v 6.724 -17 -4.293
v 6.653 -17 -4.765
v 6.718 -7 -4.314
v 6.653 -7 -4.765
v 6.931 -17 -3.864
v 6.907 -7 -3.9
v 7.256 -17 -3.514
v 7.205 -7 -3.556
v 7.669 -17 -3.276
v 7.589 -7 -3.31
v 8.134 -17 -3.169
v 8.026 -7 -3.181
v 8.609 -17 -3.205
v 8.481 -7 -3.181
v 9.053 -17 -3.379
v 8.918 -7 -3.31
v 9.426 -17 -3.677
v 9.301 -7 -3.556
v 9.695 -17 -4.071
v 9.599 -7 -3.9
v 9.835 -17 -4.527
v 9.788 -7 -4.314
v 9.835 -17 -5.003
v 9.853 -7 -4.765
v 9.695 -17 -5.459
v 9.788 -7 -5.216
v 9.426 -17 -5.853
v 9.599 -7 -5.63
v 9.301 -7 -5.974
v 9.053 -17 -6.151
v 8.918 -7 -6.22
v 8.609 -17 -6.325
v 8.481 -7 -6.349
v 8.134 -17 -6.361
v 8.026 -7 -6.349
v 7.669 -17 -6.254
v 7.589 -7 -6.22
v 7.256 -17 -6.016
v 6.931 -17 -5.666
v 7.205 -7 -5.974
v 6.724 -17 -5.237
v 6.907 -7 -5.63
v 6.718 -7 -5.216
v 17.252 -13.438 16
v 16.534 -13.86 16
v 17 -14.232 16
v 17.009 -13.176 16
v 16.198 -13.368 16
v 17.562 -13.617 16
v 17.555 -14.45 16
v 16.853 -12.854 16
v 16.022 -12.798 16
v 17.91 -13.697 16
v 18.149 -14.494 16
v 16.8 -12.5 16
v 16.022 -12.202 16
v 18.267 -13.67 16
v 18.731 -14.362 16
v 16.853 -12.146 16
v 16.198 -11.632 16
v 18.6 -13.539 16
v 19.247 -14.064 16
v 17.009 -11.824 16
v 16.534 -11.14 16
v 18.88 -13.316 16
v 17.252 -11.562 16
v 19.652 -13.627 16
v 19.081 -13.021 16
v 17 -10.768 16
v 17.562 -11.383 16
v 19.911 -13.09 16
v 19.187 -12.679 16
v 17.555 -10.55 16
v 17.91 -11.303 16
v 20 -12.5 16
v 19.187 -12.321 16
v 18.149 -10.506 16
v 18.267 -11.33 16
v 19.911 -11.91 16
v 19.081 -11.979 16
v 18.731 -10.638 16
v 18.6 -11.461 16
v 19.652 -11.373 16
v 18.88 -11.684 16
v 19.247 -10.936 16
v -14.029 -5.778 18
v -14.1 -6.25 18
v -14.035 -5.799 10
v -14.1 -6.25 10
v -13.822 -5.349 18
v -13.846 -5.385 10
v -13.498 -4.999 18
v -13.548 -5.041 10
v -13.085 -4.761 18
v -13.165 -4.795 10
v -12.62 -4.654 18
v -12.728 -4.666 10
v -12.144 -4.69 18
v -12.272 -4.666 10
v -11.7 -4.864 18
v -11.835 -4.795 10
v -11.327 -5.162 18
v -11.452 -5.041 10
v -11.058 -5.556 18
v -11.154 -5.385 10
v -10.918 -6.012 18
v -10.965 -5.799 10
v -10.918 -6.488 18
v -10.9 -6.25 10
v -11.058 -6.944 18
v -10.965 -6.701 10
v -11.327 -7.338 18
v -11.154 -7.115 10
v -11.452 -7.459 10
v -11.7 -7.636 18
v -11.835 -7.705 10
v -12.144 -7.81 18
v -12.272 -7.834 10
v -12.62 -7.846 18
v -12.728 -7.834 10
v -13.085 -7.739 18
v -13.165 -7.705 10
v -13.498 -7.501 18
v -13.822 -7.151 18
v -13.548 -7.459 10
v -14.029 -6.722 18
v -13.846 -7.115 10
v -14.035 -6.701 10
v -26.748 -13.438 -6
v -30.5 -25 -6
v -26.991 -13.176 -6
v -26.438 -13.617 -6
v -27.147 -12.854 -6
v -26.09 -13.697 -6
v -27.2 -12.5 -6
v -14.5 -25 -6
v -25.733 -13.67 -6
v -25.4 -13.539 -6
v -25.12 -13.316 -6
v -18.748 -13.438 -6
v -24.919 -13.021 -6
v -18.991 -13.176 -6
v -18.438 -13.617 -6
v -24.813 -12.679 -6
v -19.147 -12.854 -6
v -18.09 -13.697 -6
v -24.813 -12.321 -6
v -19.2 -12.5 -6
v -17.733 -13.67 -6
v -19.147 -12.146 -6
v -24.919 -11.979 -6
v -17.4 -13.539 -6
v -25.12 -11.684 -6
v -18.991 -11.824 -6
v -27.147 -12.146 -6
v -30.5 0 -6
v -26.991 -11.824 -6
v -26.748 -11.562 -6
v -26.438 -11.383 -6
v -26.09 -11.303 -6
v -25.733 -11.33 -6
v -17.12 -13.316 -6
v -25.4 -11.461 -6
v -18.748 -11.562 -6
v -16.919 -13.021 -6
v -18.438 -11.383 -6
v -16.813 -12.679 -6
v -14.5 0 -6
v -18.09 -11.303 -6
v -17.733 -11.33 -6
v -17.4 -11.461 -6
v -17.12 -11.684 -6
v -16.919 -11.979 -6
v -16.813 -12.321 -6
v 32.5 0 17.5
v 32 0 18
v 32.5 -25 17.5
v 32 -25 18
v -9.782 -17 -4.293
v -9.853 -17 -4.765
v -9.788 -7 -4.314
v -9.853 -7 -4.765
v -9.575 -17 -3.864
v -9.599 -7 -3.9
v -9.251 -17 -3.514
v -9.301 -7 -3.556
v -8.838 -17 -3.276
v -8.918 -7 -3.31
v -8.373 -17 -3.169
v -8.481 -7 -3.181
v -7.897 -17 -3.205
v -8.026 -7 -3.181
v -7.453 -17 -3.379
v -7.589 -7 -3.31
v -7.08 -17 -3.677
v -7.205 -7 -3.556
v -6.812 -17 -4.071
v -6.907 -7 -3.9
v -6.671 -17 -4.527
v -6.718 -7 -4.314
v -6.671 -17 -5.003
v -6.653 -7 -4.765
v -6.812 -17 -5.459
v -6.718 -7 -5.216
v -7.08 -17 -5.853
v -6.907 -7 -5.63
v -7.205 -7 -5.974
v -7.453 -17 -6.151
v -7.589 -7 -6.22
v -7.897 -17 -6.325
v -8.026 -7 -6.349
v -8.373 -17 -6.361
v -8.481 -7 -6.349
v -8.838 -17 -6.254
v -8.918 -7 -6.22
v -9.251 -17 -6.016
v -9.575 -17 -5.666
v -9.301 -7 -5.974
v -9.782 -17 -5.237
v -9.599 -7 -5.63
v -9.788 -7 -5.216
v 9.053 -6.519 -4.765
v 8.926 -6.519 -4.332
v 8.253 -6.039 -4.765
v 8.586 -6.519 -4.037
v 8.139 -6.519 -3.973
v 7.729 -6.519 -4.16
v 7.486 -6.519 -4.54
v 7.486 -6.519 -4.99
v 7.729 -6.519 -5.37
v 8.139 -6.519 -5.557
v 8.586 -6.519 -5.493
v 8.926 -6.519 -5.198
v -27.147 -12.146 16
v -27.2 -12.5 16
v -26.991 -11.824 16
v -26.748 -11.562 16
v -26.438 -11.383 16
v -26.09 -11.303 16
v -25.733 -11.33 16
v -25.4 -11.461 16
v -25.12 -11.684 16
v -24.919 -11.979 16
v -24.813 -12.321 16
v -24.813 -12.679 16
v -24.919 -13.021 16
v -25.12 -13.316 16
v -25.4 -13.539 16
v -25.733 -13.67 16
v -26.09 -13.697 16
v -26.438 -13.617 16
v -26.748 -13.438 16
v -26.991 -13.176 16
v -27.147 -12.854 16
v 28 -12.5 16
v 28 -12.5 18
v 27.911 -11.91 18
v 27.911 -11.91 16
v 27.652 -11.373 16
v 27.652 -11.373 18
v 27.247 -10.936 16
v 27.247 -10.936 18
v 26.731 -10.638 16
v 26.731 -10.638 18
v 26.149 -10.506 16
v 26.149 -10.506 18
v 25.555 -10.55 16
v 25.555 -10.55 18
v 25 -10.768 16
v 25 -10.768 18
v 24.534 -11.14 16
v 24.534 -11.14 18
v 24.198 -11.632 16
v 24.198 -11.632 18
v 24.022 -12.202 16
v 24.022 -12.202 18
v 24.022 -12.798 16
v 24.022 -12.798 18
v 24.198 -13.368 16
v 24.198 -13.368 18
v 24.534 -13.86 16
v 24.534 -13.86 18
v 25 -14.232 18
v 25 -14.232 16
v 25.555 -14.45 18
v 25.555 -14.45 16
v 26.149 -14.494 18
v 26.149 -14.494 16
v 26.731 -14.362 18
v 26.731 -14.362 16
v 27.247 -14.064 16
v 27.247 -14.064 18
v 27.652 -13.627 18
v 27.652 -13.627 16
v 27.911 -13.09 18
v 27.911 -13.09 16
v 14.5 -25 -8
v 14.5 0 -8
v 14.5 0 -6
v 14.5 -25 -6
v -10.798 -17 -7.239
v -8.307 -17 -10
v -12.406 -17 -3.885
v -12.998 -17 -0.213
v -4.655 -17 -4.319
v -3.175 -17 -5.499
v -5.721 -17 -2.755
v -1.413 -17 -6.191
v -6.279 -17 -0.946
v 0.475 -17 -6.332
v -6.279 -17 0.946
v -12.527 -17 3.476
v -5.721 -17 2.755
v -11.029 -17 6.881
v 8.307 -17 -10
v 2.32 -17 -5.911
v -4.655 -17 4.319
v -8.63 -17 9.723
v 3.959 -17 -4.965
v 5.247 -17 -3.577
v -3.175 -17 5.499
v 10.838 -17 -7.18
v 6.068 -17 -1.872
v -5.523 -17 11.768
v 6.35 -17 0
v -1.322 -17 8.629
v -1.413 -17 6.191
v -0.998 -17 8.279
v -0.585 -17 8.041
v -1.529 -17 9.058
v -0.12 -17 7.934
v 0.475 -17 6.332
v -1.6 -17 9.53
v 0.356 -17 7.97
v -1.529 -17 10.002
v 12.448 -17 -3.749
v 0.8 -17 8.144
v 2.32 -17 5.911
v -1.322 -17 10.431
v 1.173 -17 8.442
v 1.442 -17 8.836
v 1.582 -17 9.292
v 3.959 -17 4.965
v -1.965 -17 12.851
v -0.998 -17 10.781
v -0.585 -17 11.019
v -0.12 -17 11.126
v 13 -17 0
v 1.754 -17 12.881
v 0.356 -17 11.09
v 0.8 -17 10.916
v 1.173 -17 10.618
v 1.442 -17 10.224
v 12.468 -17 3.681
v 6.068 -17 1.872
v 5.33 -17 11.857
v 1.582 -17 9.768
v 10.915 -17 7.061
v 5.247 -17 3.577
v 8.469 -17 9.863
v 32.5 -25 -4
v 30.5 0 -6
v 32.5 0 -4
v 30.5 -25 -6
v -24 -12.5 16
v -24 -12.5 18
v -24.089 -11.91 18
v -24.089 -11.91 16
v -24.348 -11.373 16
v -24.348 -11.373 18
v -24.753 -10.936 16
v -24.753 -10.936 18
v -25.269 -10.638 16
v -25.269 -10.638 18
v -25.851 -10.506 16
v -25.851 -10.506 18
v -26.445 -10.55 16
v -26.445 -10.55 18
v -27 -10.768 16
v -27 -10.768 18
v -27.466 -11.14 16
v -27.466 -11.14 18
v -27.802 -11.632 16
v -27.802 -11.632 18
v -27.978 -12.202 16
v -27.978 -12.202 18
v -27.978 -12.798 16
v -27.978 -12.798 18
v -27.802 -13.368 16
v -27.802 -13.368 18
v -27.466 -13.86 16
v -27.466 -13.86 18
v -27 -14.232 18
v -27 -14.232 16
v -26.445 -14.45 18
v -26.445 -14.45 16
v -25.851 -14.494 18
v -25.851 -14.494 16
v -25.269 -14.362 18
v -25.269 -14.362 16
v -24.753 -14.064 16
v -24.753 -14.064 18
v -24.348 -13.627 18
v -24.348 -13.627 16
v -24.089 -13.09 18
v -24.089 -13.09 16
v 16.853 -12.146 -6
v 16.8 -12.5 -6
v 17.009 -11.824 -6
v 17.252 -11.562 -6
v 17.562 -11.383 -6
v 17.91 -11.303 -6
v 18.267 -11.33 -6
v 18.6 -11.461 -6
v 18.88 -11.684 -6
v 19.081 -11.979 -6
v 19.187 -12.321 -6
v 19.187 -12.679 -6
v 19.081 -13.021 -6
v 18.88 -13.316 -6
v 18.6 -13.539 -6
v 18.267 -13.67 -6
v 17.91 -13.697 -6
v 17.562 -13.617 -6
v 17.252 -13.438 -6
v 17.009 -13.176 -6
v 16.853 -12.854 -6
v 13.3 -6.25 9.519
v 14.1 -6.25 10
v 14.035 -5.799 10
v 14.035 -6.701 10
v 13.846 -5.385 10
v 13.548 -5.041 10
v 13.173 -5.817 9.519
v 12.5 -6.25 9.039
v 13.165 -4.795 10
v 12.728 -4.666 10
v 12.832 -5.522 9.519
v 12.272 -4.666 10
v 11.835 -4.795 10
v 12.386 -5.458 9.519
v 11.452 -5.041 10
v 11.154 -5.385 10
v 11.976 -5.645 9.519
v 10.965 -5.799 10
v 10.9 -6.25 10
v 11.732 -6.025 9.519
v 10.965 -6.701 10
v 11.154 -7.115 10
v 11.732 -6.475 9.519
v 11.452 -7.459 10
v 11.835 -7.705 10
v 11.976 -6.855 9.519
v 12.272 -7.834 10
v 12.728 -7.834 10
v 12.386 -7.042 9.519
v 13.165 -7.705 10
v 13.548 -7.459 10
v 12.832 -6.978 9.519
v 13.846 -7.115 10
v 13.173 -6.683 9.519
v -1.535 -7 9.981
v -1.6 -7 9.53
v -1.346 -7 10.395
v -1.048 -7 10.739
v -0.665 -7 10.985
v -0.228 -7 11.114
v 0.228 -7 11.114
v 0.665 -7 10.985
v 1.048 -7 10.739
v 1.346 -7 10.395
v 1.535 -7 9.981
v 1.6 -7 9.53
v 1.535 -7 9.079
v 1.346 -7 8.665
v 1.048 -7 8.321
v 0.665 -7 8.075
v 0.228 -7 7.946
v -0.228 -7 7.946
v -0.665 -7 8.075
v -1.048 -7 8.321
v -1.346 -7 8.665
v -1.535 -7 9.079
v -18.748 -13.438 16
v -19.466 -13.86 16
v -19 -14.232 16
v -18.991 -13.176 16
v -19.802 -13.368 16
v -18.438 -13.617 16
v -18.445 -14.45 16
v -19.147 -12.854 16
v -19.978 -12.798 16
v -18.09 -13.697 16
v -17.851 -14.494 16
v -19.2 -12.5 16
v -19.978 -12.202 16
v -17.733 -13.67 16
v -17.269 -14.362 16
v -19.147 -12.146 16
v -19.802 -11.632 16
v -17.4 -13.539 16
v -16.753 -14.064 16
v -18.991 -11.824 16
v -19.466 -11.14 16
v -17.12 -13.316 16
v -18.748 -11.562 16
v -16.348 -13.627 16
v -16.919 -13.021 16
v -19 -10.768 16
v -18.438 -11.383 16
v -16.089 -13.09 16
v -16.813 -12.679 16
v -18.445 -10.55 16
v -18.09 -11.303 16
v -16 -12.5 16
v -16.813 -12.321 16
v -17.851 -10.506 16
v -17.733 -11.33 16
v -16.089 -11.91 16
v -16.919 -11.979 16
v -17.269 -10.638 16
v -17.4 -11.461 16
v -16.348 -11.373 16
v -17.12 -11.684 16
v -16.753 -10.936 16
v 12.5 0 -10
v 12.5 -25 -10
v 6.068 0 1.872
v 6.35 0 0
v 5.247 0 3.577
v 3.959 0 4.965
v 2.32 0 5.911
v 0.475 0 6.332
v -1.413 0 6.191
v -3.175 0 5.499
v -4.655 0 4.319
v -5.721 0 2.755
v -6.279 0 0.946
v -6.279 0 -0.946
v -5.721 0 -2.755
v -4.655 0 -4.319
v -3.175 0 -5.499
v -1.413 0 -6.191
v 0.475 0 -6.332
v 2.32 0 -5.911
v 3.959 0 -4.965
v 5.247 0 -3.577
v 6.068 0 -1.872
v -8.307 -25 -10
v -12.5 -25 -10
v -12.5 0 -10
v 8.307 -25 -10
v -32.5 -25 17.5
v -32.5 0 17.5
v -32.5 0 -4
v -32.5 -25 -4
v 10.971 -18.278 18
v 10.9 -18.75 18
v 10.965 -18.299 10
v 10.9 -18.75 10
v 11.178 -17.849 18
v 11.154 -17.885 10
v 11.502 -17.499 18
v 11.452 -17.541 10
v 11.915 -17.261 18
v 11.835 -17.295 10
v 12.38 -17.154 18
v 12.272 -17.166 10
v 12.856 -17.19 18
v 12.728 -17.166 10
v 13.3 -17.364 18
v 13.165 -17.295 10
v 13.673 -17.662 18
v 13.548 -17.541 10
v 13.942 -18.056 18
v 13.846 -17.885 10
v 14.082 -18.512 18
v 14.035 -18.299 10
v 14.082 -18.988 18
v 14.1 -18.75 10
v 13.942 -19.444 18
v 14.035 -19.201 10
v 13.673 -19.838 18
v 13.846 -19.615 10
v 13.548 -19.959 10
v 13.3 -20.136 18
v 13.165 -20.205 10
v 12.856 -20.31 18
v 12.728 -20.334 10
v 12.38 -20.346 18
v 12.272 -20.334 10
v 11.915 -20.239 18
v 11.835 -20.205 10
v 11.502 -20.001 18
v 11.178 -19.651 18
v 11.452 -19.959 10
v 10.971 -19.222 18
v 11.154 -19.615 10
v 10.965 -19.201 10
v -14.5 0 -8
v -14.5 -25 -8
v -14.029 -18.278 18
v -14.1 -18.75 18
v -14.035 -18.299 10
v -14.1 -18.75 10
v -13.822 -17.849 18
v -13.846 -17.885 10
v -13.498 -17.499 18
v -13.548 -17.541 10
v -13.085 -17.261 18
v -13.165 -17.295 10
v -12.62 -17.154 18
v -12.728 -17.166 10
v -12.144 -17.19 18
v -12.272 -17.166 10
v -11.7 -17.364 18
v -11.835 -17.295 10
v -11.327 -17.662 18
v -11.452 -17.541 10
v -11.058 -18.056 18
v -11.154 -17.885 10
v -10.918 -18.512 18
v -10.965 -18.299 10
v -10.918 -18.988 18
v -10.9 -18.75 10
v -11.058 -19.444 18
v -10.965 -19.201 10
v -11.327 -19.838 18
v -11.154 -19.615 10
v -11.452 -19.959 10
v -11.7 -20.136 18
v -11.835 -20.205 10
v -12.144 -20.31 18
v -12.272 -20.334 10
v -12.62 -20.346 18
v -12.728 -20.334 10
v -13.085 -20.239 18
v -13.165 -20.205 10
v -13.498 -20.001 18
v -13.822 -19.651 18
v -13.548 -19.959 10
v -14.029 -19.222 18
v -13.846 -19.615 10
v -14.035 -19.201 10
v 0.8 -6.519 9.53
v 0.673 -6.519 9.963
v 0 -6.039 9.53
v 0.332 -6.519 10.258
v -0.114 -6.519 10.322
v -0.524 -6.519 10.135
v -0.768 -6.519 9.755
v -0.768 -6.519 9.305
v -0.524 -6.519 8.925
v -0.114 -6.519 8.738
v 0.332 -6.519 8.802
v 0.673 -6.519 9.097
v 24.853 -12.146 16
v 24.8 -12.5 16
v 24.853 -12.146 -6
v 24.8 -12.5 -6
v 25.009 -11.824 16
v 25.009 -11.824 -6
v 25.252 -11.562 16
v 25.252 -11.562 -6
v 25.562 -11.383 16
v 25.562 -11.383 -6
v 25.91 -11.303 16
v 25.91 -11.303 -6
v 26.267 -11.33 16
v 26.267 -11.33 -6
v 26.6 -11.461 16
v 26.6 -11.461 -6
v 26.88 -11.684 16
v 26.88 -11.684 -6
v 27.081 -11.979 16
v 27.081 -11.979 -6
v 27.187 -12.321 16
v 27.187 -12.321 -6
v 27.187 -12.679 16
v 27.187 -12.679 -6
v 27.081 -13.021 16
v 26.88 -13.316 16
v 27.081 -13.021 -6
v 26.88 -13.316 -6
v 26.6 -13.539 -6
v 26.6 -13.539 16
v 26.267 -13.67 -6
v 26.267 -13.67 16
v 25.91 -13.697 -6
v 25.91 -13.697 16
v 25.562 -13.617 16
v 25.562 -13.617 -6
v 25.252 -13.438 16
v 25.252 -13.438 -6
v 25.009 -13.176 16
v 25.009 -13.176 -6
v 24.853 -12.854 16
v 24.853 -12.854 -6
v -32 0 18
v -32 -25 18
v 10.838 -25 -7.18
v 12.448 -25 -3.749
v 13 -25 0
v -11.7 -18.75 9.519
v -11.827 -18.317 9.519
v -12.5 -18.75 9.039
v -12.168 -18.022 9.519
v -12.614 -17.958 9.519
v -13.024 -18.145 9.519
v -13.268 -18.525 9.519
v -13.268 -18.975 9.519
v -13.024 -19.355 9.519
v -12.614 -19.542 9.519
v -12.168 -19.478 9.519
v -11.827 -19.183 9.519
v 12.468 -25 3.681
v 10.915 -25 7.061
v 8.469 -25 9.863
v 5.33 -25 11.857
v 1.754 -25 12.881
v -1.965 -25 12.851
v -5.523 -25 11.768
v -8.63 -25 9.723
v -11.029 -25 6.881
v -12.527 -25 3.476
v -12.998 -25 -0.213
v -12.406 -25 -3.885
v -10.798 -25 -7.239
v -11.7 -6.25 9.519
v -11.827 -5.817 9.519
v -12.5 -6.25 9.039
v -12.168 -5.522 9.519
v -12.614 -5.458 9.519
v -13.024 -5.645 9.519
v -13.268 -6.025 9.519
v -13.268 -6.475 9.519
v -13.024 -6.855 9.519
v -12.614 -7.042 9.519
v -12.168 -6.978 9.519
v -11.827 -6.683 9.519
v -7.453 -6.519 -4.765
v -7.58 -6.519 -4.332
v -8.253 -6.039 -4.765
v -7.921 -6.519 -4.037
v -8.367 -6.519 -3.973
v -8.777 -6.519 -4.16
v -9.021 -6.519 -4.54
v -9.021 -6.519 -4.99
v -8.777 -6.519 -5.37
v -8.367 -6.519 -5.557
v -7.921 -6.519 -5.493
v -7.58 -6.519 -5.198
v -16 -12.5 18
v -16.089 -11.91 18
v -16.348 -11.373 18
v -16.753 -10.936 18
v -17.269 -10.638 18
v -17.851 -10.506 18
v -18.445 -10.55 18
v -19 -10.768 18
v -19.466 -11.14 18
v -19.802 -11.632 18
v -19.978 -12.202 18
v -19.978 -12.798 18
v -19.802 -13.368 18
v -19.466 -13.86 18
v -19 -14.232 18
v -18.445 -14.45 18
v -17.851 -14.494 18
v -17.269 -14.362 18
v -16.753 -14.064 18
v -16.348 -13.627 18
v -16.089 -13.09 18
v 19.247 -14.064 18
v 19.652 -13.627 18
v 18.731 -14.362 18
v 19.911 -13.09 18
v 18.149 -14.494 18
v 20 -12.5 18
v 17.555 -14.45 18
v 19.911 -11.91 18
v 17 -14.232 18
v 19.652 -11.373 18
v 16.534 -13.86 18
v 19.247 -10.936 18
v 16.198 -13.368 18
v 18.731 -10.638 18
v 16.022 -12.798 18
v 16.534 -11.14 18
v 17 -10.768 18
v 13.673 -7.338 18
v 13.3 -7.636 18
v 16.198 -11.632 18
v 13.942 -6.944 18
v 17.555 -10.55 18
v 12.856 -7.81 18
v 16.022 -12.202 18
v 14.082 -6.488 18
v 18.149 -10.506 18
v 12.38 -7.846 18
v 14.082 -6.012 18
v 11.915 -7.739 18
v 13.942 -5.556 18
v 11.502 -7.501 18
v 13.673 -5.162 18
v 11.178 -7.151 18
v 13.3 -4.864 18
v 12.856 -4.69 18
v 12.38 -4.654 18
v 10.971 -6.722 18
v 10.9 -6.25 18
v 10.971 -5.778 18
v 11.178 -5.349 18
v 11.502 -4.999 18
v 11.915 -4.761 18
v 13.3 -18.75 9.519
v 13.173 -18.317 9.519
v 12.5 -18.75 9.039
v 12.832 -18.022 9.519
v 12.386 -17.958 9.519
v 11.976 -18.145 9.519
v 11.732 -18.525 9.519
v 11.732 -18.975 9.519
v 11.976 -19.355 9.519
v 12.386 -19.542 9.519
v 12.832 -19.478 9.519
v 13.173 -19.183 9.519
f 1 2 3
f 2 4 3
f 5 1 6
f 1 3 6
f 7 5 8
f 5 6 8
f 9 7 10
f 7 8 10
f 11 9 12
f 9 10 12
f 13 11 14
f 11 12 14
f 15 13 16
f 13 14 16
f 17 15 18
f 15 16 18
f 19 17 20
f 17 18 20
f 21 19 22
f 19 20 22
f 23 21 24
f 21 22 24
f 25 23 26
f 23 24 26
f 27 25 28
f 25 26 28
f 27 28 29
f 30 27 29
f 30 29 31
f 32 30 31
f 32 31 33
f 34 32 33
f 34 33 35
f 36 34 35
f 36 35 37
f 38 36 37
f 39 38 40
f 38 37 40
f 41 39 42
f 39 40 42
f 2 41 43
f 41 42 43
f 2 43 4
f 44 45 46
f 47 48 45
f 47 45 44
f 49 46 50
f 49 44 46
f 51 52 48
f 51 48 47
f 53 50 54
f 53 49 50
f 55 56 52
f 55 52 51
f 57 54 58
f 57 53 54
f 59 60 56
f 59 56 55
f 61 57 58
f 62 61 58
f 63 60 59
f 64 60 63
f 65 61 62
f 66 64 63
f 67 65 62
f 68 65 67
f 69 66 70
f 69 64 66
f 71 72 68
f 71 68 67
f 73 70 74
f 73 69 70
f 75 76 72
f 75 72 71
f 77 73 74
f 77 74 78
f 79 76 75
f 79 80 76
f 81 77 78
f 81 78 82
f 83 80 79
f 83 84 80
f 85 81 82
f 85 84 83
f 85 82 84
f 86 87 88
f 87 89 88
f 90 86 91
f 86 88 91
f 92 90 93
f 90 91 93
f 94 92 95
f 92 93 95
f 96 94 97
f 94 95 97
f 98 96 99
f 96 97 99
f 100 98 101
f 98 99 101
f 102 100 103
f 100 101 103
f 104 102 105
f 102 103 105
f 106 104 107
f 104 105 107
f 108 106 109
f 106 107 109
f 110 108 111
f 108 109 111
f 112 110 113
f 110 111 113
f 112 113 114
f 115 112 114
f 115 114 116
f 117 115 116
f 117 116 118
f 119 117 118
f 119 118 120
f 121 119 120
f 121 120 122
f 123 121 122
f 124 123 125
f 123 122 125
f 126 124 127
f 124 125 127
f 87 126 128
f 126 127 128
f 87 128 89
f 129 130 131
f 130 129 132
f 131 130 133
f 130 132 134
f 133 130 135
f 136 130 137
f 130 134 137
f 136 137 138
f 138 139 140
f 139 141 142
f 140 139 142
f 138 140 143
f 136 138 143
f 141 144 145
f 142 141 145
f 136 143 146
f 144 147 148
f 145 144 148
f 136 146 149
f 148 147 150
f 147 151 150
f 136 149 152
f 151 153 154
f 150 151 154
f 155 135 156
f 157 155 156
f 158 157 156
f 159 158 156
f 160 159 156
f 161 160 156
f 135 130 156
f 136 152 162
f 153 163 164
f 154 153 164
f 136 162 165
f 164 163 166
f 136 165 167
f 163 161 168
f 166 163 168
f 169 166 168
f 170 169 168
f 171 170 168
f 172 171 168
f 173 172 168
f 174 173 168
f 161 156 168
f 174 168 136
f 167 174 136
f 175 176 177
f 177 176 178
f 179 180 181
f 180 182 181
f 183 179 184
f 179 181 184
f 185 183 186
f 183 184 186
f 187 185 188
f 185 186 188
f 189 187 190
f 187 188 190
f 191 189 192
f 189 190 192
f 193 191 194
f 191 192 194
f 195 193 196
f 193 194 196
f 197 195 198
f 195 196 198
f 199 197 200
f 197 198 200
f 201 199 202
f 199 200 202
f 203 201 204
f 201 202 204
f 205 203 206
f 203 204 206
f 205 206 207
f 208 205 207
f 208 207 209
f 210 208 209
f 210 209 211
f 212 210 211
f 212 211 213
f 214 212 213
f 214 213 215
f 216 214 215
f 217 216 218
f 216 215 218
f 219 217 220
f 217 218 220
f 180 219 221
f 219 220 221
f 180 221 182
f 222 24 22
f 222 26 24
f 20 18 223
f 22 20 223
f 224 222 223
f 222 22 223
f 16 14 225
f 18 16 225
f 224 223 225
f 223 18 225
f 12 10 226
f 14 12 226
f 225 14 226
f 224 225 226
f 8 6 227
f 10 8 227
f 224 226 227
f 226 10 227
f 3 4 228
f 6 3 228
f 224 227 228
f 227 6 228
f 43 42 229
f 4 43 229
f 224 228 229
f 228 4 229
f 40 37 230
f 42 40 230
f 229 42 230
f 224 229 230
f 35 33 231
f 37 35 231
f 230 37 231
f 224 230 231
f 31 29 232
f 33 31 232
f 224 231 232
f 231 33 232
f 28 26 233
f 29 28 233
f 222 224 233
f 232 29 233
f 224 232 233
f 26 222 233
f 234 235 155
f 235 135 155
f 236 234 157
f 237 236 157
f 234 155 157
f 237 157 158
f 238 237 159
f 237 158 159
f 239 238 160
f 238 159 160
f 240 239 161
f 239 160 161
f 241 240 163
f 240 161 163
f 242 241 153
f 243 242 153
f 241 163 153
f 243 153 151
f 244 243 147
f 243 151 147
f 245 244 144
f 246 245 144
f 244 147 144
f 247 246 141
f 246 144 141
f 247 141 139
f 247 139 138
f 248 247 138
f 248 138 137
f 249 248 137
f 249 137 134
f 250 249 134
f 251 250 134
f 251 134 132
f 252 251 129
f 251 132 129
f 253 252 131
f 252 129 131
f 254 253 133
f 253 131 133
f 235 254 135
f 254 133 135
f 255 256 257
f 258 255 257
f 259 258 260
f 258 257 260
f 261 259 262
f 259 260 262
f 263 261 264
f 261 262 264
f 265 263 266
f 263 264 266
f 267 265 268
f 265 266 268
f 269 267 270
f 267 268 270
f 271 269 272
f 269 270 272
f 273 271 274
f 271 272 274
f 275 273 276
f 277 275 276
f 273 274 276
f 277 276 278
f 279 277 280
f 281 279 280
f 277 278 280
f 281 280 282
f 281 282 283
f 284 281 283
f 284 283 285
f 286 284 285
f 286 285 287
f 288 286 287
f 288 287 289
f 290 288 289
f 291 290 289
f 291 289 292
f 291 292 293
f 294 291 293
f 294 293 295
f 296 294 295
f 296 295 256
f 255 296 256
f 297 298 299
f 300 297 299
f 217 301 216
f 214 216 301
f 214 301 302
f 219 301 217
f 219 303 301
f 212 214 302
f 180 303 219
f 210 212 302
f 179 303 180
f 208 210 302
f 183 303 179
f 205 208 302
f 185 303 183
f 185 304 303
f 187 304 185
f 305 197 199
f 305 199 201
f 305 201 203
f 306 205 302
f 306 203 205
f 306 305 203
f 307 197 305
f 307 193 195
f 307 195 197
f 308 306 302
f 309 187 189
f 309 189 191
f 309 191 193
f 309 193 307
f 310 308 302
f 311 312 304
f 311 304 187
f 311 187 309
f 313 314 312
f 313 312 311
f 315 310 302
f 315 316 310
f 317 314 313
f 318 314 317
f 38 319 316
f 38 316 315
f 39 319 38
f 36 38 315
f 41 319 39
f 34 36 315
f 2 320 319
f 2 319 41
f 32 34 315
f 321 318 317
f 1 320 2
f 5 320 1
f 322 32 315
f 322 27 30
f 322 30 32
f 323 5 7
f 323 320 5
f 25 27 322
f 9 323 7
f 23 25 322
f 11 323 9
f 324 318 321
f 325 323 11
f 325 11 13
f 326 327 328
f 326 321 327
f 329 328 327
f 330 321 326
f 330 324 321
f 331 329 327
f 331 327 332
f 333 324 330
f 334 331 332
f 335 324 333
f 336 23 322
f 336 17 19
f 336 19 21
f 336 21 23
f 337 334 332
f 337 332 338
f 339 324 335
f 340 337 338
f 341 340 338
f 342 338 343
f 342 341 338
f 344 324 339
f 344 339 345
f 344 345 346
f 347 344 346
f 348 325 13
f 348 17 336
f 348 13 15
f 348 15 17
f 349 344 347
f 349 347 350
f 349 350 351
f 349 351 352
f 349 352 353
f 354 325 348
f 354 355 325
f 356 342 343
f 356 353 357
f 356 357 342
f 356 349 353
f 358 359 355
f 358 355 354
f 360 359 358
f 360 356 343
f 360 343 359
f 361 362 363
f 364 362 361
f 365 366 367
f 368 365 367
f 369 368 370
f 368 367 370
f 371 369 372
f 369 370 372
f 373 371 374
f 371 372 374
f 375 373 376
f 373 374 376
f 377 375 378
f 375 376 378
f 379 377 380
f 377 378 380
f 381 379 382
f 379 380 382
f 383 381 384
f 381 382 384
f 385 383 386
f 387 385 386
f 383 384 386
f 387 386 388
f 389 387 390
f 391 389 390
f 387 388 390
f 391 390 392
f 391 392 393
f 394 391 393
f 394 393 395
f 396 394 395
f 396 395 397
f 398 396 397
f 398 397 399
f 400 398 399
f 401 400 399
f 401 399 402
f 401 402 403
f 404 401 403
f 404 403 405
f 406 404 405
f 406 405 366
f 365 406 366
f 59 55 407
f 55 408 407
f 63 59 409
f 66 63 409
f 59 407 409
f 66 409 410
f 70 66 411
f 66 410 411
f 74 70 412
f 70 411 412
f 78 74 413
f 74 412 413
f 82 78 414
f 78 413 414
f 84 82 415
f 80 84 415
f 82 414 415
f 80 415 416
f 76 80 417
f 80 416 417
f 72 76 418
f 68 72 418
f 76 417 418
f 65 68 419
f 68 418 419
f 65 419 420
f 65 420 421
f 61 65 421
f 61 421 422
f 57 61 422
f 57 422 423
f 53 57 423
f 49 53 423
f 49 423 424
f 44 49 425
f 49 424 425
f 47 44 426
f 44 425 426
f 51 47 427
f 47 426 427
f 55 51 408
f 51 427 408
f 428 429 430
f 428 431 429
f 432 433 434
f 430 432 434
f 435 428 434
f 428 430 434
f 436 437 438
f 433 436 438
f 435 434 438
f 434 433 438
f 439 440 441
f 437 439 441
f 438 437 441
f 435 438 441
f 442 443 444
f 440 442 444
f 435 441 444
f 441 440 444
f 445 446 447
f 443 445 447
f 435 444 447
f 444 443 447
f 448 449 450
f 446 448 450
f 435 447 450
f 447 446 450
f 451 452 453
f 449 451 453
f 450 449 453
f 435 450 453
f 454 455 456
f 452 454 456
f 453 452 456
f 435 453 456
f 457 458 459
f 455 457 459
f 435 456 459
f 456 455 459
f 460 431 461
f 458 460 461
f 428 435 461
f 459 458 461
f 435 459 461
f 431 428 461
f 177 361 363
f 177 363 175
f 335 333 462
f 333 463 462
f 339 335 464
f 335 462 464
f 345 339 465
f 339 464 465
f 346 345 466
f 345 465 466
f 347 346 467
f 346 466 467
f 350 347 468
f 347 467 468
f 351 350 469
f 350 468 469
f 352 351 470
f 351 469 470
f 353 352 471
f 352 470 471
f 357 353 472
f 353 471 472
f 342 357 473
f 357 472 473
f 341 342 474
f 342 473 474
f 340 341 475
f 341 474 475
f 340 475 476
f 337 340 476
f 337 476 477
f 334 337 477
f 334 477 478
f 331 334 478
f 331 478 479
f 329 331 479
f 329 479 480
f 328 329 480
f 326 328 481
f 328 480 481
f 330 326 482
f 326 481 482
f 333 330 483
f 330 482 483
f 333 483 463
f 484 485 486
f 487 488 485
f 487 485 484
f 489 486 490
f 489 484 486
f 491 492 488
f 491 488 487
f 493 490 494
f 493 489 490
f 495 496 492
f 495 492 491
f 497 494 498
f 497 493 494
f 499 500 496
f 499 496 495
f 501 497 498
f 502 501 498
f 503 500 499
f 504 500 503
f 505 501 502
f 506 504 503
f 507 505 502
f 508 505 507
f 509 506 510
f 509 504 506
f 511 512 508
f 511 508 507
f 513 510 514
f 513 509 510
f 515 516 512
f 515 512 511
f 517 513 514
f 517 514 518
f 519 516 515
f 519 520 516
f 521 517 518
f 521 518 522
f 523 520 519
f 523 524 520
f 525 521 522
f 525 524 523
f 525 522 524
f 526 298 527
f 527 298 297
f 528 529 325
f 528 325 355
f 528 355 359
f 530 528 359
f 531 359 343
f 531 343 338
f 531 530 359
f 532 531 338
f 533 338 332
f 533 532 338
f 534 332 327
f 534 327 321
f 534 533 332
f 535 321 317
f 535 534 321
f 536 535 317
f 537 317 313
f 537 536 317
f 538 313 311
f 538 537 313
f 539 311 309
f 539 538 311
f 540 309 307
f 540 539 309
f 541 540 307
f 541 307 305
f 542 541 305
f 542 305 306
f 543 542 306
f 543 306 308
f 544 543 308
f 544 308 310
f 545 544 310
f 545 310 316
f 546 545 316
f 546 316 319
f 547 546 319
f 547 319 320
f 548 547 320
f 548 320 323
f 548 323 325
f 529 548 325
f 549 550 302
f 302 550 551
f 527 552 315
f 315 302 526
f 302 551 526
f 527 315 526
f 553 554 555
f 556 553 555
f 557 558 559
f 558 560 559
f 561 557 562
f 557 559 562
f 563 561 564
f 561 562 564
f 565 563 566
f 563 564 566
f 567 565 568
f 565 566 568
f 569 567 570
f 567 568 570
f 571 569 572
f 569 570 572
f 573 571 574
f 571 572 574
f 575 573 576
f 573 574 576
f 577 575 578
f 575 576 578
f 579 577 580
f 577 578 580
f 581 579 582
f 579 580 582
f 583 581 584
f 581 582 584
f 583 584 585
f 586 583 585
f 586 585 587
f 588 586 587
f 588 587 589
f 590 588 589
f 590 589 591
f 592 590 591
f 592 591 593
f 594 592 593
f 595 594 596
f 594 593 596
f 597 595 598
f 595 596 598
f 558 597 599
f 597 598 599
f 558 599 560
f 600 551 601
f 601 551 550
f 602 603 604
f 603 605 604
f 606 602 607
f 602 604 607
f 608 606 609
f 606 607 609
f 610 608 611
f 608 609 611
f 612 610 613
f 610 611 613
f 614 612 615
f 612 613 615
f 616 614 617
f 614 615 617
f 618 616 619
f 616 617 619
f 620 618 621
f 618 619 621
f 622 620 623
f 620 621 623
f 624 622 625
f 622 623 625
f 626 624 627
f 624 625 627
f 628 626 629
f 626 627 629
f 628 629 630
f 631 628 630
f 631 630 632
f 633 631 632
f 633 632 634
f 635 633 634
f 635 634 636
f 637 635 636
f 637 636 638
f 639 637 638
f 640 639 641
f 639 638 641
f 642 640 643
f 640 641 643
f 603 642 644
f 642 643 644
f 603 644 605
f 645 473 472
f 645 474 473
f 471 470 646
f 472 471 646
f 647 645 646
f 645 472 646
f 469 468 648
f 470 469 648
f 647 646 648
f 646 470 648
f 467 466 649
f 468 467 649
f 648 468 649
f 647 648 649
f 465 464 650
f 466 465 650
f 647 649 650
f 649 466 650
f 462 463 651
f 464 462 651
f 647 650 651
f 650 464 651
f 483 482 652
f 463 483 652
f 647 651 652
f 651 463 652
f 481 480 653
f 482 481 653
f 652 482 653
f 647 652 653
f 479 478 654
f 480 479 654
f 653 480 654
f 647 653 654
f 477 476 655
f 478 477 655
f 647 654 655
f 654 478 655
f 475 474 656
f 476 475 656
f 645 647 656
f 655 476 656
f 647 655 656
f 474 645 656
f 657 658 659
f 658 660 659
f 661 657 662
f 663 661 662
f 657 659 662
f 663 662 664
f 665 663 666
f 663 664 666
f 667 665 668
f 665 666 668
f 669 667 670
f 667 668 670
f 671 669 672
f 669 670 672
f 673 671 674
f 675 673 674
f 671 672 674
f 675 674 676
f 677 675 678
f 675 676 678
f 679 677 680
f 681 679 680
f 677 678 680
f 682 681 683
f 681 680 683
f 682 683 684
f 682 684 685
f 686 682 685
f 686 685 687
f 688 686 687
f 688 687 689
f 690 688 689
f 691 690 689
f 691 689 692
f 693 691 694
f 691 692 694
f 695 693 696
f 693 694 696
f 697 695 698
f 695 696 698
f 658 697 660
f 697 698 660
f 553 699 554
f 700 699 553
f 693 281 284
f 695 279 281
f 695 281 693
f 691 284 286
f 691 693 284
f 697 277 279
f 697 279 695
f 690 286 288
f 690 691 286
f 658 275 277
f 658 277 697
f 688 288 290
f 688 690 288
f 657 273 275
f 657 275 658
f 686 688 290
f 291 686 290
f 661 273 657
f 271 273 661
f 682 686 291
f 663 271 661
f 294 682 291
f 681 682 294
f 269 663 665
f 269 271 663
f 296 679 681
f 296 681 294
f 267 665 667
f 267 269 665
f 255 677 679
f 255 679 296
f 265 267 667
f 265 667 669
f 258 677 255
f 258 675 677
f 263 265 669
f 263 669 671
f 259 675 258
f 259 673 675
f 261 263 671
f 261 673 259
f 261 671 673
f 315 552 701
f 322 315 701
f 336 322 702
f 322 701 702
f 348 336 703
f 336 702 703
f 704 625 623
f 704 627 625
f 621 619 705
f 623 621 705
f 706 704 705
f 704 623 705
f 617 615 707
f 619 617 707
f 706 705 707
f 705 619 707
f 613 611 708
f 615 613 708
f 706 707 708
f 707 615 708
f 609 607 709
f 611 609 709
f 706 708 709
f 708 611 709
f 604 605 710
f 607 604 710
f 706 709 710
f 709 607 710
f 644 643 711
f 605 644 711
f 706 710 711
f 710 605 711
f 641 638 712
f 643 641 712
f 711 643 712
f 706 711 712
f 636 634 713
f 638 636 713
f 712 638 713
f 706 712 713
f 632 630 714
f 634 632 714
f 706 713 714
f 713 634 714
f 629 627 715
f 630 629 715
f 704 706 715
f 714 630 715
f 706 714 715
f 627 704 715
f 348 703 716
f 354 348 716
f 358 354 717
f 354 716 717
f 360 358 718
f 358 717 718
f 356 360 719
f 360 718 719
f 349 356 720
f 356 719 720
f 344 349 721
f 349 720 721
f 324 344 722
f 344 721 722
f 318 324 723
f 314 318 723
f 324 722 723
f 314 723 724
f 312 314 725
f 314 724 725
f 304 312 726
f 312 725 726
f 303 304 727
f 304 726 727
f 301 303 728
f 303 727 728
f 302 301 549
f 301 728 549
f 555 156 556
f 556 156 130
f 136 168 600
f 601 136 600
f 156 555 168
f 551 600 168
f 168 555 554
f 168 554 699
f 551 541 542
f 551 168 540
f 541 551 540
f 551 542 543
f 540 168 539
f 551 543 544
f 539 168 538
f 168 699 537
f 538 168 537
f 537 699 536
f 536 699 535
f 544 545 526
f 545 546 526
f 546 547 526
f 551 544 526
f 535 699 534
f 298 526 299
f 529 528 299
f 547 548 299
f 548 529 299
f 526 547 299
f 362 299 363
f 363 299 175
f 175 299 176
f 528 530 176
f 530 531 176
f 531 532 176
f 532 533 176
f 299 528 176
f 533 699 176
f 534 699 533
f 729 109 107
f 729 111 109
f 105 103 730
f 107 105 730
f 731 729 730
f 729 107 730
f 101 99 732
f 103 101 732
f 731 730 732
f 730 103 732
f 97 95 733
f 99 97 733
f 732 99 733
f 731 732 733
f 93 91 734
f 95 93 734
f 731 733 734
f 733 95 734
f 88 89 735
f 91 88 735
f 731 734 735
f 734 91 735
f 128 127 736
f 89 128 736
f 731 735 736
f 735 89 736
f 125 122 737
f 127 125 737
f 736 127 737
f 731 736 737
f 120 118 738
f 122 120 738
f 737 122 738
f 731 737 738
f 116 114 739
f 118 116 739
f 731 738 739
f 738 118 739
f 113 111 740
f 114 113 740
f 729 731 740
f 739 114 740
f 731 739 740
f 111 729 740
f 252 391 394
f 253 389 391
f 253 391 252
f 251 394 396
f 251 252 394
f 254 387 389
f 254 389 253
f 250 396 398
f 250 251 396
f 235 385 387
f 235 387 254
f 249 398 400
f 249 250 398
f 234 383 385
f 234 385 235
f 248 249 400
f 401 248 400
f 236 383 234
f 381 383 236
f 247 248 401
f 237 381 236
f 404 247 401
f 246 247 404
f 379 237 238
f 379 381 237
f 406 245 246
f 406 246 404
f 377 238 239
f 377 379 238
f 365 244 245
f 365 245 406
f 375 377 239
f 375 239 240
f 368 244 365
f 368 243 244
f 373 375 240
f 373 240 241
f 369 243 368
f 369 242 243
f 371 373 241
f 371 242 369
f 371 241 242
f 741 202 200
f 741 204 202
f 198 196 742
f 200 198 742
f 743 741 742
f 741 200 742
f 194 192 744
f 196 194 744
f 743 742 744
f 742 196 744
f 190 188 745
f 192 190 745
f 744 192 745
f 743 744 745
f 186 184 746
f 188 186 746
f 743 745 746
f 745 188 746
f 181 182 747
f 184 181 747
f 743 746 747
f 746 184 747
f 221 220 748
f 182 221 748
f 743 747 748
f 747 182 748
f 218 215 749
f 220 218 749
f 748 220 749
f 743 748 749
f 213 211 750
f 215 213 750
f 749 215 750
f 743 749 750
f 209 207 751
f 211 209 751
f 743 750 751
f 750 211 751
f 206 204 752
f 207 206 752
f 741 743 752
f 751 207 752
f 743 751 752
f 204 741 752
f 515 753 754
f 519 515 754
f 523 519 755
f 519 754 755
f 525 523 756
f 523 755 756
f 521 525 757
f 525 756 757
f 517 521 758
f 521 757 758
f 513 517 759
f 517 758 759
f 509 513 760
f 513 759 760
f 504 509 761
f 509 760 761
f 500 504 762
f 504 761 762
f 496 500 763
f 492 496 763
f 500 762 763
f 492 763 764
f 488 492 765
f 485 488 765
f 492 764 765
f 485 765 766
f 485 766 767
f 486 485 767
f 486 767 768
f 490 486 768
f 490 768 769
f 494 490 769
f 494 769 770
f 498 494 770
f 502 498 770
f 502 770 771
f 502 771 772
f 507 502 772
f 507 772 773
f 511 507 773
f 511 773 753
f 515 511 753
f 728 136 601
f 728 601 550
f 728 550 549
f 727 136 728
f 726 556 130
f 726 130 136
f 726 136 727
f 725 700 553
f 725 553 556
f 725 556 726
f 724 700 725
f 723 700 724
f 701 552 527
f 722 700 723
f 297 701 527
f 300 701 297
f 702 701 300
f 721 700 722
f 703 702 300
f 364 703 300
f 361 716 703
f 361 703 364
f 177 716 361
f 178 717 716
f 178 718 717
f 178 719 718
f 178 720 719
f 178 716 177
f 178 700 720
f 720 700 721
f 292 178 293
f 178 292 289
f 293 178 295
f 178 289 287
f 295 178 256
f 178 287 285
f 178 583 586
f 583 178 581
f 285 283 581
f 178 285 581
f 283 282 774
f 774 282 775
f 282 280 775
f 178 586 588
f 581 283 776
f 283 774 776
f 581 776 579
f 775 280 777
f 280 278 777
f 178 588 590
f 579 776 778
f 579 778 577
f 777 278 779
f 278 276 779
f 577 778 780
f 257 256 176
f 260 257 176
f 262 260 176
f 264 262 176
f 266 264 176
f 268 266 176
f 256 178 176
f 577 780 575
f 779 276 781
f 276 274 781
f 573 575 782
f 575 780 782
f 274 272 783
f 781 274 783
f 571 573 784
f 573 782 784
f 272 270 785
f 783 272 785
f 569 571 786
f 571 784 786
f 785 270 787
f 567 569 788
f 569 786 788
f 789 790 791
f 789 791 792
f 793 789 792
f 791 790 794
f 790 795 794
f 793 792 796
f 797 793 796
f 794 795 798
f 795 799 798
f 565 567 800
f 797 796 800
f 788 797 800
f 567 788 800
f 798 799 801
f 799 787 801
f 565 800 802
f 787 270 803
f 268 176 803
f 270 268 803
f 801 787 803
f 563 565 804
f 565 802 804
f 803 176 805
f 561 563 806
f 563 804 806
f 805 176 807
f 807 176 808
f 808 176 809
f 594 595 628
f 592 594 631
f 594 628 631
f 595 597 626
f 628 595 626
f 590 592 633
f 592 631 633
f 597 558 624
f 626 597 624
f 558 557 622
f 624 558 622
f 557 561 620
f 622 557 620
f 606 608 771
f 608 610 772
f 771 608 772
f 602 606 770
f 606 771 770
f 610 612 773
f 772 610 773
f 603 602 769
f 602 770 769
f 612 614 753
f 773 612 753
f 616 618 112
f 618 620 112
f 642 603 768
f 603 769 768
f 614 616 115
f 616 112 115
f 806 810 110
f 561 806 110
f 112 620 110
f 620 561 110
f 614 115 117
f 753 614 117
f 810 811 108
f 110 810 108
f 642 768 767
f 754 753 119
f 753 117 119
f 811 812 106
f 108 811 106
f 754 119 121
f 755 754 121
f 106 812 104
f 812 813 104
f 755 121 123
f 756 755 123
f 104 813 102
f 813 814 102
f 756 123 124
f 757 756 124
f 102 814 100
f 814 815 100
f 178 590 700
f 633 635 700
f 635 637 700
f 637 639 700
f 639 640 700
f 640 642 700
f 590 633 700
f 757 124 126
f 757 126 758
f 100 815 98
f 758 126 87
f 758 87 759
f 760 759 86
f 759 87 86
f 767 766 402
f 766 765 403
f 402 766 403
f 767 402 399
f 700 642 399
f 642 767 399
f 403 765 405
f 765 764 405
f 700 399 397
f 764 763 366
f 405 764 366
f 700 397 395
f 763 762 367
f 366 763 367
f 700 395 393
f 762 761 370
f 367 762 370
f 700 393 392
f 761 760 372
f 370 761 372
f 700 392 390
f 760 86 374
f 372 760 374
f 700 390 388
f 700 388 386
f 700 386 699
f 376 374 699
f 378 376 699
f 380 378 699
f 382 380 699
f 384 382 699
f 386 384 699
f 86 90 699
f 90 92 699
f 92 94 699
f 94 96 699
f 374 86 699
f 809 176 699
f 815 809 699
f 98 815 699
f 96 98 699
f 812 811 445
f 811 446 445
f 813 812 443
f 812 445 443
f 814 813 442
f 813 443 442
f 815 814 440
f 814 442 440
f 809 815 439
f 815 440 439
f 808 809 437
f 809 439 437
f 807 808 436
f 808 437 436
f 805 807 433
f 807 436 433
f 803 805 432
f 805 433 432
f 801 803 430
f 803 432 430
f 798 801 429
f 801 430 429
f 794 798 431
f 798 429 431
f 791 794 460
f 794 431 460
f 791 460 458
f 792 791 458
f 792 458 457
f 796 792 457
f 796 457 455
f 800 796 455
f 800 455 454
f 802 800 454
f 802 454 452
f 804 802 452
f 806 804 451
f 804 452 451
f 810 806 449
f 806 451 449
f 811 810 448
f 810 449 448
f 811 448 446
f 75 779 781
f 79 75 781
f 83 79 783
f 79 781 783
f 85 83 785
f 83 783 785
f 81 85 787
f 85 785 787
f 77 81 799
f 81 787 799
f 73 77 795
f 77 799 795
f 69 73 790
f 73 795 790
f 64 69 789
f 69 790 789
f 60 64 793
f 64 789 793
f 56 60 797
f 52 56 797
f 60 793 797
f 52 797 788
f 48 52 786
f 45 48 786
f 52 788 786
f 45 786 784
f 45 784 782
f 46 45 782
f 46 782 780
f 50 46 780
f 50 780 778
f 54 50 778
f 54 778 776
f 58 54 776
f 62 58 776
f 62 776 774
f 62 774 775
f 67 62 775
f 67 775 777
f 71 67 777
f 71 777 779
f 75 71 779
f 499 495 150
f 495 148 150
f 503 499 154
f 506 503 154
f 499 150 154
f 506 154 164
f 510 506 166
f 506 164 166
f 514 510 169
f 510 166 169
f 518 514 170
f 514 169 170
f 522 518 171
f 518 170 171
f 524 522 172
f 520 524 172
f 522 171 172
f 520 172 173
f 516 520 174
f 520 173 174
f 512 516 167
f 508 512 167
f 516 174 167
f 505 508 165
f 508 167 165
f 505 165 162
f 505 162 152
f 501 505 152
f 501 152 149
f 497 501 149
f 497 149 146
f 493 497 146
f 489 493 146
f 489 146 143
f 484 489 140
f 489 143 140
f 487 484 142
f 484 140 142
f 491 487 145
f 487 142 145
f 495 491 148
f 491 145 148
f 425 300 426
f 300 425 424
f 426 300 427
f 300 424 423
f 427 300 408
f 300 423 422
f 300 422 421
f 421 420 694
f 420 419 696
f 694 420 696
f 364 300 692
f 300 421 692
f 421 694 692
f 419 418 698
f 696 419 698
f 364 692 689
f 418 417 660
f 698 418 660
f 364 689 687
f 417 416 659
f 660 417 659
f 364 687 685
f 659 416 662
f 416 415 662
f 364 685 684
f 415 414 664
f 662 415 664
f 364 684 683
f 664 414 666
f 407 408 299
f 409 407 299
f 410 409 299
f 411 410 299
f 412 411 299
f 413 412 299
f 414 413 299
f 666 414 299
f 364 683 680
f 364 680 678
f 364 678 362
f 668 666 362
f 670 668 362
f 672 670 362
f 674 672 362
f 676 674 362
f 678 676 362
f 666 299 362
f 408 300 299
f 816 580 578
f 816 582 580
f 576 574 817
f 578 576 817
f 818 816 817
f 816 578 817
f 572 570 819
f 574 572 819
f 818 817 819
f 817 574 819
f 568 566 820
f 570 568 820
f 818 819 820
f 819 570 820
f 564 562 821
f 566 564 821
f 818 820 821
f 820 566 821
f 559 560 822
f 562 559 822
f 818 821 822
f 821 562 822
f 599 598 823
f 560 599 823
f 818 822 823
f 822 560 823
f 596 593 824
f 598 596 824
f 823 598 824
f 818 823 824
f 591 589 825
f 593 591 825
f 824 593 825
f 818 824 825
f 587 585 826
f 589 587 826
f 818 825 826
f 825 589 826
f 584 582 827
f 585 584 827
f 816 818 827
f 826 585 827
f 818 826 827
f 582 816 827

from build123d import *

# Parameters (mm, degrees)
F0_R           = 6.35
F1_DEPTH       = 25
F2_SIZE        = 0.5
F3_R           = 6.35
F4_DEPTH       = 8
F5_SIZE        = 2
F7_D           = 3.2
F7_DEPTH       = 8
F7_TIP         = 0.9613769904
F9_D           = 2.4
F9_CBORE_D     = 4
F9_CBORE_DEPTH = 2
F11_D          = 3.2
F11_DEPTH      = 10
F11_TIP        = 0.9613769904


with BuildPart() as f1:
    # F0 (on Front) → F1 (new body)
    with BuildSketch(Plane.XZ):
        Polygon((-14.5, -10), (14.5, -10), (14.5, -6), (32.5, -6), (32.5, 18), (-32.5, 18), (-32.5, -6), (-14.5, -6), align=None)
        Circle(F0_R, mode=Mode.SUBTRACT)
    extrude(amount=F1_DEPTH)

    # F2
    f2_edges = [f1.edges().sort_by_distance(p)[0] for p in [
        (-32.5, -12.5, 18),
        (32.5, -12.5, 18),
    ]]
    chamfer(f2_edges, length=F2_SIZE)

    # F3 (on face) → F4 (cut)
    with BuildSketch(Plane.XZ.offset(25)):
        with BuildLine():
            ThreePointArc((8.3066238629, -10), (11.7683072321, -5.5233092337), (13, 0))
            ThreePointArc((13, 0), (-5.5233092337, 11.7683072321), (-8.3066238629, -10))
            Line((-8.3066238629, -10), (8.3066238629, -10))
        make_face()
        Circle(F3_R, mode=Mode.SUBTRACT)
    extrude(amount=-F4_DEPTH, mode=Mode.SUBTRACT)

    # F5
    f5_edges = [f1.edges().sort_by_distance(p)[0] for p in [
        (32.5, -12.5, -6),
        (14.5, -12.5, -10),
        (-14.5, -12.5, -10),
        (-32.5, -12.5, -6),
    ]]
    chamfer(f5_edges, length=F5_SIZE)

    # F7
    with Locations(Plane.XY.offset(18)):
        with Locations((12.5, -6.25), (12.5, -18.75), (-12.5, -6.25), (-12.5, -18.75)):
            Hole(F7_D / 2, depth=F7_DEPTH)
            with Locations((0, 0, -(F7_DEPTH + F7_TIP / 2))):  # 118° drill point
                Cone(0, F7_D / 2, F7_TIP, mode=Mode.SUBTRACT)

    # F9 (through all)
    with Locations(Plane.XY.offset(18)):
        with Locations((-26, -12.5), (-18, -12.5), (18, -12.5), (26, -12.5)):
            CounterBoreHole(F9_D / 2, F9_CBORE_D / 2, F9_CBORE_DEPTH)

    # F11
    with Locations(Plane.XZ.offset(17)):
        with Locations((0, 9.53), (8.2532220981, -4.765), (-8.2532220981, -4.765)):
            Hole(F11_D / 2, depth=F11_DEPTH)
            with Locations((0, 0, -(F11_DEPTH + F11_TIP / 2))):  # 118° drill point
                Cone(0, F11_D / 2, F11_TIP, mode=Mode.SUBTRACT)


solid = f1.part
